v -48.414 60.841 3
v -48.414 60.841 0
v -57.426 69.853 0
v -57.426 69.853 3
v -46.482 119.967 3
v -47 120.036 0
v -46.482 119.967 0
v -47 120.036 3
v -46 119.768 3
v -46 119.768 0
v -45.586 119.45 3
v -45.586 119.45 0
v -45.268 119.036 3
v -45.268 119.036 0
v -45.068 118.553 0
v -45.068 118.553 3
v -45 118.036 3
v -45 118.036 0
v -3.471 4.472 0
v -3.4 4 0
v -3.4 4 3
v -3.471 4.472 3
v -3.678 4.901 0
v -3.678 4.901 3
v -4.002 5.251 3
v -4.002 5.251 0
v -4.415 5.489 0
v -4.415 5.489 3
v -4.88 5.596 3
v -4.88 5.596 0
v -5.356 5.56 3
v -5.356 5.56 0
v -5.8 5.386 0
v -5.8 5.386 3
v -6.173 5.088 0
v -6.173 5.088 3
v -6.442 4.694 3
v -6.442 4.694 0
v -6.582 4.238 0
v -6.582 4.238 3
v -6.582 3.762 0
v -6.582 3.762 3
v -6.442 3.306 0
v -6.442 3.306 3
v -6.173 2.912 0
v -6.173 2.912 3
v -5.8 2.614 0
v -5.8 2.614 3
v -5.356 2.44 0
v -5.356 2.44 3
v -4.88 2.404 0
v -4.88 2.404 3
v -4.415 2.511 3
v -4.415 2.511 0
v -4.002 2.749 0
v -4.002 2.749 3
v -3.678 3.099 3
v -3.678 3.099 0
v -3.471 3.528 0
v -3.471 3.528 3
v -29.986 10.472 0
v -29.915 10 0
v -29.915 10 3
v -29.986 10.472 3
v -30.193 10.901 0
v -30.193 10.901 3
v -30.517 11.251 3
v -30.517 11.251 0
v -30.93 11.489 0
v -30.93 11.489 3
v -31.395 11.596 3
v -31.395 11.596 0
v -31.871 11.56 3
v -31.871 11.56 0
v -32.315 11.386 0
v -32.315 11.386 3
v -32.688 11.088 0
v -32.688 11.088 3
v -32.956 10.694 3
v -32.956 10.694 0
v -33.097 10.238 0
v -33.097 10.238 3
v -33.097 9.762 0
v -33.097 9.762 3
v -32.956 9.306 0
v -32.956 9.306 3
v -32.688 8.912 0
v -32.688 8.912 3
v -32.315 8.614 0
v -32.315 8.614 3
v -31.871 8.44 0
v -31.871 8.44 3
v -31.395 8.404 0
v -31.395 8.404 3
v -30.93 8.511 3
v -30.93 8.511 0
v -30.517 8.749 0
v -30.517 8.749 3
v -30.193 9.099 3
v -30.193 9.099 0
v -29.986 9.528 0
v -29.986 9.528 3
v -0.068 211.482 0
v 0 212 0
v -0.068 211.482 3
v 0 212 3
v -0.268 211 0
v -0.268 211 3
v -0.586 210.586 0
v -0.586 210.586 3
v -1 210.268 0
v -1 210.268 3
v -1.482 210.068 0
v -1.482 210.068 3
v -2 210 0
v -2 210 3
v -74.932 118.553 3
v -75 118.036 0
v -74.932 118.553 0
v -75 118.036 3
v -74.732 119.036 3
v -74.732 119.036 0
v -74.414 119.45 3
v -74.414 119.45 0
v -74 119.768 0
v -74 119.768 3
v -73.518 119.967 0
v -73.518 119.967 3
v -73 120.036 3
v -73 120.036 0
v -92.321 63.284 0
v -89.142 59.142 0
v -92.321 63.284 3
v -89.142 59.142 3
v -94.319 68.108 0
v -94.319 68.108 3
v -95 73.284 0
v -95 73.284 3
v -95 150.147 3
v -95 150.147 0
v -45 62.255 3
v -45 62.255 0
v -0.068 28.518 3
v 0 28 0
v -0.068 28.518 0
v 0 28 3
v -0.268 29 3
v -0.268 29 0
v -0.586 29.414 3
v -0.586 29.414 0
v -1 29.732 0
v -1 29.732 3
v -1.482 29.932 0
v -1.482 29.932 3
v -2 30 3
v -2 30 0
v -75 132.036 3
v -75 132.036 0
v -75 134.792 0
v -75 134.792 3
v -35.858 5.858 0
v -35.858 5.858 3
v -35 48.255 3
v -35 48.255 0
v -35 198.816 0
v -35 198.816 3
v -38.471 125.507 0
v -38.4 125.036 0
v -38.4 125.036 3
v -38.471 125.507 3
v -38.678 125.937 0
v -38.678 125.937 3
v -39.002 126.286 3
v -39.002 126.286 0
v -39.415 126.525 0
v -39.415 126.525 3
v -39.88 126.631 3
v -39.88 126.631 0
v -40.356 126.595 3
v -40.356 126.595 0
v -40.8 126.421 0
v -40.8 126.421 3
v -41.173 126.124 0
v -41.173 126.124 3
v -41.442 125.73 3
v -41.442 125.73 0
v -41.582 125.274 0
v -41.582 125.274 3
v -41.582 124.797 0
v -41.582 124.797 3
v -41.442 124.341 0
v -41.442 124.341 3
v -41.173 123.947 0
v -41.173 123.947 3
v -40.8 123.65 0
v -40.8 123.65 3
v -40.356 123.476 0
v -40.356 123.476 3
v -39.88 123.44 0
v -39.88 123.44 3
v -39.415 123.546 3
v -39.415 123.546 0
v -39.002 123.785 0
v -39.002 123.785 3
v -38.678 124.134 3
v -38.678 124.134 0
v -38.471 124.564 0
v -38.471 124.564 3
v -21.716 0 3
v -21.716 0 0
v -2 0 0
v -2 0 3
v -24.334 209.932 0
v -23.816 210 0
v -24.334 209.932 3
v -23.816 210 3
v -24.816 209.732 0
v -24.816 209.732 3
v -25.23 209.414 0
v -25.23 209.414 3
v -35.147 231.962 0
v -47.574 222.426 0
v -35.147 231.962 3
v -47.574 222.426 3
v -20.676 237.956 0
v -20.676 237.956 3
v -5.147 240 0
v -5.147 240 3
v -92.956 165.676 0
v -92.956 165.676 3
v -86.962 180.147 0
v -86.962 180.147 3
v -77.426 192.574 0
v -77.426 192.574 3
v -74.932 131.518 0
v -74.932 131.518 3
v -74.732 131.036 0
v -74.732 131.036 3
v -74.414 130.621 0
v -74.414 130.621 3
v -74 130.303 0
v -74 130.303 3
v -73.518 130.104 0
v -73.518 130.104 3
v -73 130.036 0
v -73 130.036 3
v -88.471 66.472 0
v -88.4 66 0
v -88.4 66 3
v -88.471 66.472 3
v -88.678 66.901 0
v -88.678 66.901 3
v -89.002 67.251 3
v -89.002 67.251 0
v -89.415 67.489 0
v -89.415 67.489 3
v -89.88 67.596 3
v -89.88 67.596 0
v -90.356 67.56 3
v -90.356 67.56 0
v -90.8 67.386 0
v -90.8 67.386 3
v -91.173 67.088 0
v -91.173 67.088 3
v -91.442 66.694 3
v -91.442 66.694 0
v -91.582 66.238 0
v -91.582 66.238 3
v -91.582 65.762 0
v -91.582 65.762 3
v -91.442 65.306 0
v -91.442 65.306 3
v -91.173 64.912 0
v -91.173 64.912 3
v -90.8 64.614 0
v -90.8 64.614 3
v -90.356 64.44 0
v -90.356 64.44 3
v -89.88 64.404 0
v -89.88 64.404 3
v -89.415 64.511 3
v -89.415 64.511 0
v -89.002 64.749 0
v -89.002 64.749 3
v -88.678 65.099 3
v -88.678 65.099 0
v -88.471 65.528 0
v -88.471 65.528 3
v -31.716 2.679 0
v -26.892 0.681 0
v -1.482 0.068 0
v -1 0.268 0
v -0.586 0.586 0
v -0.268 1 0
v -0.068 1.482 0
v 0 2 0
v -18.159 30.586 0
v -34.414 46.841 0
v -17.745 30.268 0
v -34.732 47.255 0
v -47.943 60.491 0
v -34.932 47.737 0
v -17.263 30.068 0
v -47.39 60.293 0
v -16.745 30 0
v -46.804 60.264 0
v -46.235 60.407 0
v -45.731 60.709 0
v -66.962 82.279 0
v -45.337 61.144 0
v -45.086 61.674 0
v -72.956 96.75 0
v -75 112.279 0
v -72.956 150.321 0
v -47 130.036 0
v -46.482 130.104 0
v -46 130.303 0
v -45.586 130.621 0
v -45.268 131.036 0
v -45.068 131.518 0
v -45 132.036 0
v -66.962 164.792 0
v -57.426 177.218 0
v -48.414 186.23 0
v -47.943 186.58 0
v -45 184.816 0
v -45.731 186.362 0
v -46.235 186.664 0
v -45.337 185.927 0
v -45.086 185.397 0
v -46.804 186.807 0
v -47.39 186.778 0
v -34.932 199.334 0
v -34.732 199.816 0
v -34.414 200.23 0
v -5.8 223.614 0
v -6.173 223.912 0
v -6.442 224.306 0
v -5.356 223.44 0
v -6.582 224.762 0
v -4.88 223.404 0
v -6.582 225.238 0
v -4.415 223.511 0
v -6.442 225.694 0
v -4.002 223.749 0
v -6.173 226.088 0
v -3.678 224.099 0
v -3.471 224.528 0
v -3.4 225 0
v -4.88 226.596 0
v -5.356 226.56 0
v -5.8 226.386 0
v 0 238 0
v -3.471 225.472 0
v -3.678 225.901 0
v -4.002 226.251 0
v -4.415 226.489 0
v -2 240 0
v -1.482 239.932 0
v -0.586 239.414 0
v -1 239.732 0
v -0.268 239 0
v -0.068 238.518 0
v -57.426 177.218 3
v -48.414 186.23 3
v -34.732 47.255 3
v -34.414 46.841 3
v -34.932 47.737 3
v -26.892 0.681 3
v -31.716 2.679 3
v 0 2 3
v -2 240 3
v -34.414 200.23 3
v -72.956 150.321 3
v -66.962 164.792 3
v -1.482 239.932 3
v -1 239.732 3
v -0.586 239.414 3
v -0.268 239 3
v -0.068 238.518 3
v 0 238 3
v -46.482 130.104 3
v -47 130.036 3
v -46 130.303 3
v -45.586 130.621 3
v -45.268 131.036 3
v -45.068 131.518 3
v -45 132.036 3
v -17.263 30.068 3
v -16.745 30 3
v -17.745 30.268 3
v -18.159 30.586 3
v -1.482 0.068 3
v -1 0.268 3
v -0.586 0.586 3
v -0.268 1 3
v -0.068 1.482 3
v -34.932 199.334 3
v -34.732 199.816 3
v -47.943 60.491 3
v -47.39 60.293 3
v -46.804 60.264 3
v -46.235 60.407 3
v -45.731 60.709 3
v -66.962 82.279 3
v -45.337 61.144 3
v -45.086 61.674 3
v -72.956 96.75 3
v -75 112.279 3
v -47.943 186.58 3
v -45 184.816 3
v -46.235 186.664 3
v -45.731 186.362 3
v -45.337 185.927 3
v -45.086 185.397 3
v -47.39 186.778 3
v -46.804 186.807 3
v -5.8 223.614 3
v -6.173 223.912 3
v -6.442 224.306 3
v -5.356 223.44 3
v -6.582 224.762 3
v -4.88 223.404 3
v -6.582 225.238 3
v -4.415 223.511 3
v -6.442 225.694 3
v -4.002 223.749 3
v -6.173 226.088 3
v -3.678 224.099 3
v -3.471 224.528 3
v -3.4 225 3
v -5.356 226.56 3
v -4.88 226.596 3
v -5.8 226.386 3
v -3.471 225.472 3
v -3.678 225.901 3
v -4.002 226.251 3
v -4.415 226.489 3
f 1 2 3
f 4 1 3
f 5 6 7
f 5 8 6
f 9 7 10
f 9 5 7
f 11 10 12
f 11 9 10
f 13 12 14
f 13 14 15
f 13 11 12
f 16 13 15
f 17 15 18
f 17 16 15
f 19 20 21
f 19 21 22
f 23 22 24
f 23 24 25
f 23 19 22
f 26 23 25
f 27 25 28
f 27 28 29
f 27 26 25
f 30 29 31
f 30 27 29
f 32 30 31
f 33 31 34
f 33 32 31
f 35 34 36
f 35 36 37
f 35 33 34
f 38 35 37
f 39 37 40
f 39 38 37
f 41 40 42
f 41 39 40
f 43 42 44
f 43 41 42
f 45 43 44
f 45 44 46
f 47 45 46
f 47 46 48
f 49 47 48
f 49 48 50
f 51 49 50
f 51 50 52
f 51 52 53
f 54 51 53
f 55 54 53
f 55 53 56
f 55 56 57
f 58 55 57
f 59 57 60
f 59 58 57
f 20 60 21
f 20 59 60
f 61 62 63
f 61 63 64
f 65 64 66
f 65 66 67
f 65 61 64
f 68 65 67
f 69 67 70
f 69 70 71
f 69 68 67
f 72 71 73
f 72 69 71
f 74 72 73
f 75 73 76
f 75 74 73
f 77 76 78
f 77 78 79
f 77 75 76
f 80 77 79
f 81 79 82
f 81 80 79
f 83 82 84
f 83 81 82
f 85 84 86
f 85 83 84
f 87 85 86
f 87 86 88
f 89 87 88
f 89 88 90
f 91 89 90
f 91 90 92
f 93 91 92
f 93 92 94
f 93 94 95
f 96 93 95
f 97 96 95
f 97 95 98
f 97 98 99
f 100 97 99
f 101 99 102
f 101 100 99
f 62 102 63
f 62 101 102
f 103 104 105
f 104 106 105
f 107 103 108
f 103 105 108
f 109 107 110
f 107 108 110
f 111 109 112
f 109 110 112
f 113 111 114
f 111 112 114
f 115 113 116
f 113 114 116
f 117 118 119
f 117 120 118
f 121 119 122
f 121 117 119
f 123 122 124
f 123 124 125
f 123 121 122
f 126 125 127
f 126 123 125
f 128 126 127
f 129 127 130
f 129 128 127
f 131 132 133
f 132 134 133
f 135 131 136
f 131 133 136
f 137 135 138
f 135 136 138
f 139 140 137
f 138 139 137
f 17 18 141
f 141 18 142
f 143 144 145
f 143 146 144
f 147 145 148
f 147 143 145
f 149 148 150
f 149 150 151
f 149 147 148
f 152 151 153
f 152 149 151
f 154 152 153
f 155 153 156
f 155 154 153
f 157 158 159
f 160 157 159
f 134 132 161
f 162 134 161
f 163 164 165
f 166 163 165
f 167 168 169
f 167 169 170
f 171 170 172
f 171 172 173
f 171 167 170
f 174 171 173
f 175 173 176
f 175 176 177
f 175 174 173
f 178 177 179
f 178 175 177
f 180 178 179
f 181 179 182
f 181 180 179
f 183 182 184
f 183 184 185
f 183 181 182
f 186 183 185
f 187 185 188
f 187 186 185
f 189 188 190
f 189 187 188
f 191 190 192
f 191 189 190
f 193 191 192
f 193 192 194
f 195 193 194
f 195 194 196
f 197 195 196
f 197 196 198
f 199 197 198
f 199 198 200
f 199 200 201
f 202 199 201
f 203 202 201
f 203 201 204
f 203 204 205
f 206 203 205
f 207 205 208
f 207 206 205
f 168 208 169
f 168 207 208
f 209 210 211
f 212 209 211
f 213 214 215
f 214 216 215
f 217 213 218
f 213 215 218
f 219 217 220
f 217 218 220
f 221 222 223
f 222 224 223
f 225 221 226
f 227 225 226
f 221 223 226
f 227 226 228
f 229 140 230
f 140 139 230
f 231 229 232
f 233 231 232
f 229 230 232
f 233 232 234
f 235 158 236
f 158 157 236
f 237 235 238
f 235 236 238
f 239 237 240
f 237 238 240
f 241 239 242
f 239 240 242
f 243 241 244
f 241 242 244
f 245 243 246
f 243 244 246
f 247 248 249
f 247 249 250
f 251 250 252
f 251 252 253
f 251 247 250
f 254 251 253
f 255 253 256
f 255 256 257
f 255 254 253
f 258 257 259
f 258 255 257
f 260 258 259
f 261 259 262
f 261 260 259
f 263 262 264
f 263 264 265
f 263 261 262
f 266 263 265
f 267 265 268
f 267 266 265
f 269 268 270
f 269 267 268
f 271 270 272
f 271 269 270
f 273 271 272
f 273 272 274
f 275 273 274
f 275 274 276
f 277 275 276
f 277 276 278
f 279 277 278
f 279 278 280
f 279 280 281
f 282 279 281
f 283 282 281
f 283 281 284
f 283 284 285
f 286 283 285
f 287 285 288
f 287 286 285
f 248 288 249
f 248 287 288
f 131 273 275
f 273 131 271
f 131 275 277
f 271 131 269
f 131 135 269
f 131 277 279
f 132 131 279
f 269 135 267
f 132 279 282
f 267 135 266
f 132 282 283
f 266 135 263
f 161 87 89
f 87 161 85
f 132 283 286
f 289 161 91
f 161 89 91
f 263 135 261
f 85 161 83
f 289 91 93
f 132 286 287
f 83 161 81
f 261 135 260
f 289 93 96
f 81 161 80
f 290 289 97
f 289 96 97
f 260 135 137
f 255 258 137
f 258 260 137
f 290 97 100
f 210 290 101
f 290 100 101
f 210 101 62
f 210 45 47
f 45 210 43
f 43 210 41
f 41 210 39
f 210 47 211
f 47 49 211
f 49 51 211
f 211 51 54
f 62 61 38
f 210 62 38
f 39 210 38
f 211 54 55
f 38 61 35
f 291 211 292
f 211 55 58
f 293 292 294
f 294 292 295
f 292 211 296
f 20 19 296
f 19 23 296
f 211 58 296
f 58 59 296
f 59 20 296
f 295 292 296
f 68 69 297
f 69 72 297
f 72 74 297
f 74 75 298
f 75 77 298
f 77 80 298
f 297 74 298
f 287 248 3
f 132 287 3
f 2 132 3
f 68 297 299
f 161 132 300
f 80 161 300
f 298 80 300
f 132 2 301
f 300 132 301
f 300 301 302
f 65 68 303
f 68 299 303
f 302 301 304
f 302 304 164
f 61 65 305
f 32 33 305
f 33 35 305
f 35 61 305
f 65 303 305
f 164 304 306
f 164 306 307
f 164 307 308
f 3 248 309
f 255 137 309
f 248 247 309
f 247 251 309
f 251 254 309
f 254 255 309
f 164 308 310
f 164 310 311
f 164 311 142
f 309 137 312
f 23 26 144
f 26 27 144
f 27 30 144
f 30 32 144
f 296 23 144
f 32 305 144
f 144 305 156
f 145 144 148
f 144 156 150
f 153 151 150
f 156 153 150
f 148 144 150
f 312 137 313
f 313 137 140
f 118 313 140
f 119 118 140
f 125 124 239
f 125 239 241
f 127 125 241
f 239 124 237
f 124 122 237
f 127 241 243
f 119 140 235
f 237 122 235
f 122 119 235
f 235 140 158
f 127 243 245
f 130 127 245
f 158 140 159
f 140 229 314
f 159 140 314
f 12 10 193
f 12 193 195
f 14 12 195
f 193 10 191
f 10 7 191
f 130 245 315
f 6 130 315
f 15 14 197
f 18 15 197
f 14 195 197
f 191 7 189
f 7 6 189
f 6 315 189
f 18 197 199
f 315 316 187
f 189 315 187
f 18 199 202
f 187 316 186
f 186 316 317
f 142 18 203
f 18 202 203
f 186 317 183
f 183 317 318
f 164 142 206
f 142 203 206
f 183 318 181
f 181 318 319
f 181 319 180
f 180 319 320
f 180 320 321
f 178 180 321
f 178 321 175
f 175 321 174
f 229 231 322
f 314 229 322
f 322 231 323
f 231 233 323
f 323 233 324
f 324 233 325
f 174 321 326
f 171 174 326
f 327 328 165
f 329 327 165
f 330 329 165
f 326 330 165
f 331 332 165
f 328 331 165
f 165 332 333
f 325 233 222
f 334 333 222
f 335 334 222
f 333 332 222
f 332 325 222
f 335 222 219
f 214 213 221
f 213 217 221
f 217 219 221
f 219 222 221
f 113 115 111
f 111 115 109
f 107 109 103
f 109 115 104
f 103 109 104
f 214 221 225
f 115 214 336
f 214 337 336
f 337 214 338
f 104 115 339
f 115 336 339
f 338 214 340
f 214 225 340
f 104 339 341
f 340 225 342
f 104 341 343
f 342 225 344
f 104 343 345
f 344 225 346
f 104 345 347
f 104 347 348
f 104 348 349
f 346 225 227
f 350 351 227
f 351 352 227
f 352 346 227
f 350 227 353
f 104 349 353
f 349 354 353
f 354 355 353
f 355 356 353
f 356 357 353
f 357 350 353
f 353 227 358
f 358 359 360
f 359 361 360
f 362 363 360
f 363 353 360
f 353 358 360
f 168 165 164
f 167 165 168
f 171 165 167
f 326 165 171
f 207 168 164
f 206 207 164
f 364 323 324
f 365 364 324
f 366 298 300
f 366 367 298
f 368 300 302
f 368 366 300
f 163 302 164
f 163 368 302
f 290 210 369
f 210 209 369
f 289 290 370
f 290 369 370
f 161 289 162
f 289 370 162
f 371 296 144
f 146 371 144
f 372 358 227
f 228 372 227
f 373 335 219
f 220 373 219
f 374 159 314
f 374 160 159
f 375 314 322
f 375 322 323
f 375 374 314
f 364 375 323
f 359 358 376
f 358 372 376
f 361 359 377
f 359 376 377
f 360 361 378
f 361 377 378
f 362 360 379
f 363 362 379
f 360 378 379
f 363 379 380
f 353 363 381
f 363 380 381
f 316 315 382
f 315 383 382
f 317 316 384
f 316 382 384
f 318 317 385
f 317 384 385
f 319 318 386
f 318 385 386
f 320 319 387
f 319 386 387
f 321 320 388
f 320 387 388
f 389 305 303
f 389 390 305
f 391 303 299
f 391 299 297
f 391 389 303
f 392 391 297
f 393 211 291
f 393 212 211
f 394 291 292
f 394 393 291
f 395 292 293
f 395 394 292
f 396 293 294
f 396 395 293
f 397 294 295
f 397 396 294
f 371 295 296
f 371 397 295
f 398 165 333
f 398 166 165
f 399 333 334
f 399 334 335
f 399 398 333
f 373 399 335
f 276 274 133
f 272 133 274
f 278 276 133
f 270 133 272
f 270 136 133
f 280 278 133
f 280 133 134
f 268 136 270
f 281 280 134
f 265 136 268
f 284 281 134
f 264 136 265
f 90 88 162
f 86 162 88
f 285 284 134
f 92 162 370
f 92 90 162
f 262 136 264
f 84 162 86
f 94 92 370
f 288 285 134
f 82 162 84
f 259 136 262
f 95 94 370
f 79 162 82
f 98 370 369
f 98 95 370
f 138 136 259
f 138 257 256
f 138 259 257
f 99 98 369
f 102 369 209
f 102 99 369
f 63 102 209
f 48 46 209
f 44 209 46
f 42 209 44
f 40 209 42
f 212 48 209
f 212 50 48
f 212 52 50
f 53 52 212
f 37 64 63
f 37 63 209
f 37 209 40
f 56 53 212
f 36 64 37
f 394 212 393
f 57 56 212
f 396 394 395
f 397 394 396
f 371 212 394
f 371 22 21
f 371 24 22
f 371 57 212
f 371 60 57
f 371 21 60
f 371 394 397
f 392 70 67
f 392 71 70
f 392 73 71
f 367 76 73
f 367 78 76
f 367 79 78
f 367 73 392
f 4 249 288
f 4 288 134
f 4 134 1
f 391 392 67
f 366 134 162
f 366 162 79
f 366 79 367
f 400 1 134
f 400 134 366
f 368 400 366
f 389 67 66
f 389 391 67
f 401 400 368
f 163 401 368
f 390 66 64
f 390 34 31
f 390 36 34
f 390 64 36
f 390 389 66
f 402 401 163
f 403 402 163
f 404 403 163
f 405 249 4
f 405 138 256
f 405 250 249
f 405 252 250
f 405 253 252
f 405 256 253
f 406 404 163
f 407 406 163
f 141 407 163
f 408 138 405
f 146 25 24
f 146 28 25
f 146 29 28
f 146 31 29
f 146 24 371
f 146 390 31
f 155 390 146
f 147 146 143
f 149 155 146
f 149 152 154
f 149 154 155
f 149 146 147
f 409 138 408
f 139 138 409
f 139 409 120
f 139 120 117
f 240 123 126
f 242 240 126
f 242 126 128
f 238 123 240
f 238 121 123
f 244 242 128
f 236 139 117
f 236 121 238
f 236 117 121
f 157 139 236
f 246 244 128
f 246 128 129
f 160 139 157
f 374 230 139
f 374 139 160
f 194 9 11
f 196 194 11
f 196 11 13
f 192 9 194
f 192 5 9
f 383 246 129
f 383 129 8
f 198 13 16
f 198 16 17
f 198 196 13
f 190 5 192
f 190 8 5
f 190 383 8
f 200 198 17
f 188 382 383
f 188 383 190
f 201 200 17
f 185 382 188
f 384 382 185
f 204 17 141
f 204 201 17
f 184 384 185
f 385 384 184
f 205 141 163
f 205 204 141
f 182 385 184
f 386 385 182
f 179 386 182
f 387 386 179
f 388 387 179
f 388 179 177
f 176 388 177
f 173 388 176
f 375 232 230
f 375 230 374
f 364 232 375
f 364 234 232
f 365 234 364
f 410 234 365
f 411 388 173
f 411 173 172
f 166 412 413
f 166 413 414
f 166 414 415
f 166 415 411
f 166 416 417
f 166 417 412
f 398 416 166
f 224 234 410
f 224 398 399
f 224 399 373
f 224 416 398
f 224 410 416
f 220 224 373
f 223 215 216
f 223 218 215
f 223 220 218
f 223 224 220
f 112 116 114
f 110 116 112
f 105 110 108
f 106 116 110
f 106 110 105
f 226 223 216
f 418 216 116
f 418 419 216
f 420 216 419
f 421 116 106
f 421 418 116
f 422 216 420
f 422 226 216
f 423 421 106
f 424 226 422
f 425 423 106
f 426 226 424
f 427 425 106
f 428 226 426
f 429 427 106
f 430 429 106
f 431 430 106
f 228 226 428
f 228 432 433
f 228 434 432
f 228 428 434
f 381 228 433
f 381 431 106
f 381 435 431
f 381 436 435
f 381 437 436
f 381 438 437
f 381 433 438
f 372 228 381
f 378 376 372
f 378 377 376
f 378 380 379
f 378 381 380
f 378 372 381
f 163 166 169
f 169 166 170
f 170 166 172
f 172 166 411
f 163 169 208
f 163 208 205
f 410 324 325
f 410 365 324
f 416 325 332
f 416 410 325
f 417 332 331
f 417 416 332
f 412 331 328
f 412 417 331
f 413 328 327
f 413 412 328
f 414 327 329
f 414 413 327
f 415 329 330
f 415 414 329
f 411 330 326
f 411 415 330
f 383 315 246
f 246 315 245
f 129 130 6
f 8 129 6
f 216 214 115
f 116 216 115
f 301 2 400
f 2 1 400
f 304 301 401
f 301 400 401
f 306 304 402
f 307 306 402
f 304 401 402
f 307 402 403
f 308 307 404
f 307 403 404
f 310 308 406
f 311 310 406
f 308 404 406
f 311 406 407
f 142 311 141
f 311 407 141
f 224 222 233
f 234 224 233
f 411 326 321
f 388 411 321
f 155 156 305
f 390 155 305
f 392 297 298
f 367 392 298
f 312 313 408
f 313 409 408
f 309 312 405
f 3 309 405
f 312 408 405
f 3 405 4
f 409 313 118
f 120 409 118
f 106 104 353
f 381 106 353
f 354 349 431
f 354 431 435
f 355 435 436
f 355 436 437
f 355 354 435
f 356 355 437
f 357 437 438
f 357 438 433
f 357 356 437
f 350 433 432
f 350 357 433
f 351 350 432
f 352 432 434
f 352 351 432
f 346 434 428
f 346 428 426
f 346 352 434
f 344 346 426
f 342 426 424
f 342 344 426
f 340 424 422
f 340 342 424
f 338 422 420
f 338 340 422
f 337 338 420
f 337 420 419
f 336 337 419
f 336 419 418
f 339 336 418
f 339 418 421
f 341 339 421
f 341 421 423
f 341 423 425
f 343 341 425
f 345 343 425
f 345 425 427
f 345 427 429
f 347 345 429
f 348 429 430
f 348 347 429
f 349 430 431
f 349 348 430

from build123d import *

# Parameters (mm, degrees)
SKETCH_1_R      = 1.6
EXTRUDE_1_DEPTH = 3
FILLET_1_R      = 60
FILLET_2_R      = 2
FILLET_3_R      = 20
FILLET_4_R      = 2


with BuildPart() as part:
    # ｽｹｯﾁ1 → ﾎﾞｽ - 押し出し1 (new body)
    with BuildSketch(Plane.XY):
        Polygon((-30, 0), (0, 0), (0, 30), (-17.573593129, 30), (-35, 47.426406871), (-35, 199.644660941), (-24.644660941, 210), (0, 210), (0, 240), (-30, 240), (-95, 175), (-95, 65), align=None)
        Polygon((-75, 159.644660941), (-45, 189.644660941), (-45, 130.035533906), (-75, 130.035533906), align=None, mode=Mode.SUBTRACT)
        Polygon((-45, 120.035533906), (-45, 57.426406871), (-75, 87.426406871), (-75, 120.035533906), align=None, mode=Mode.SUBTRACT)
        with Locations((-90, 66)):
            Circle(SKETCH_1_R, mode=Mode.SUBTRACT)
        with Locations((-31.514718626, 10)):
            Circle(SKETCH_1_R, mode=Mode.SUBTRACT)
        with Locations((-5, 4)):
            Circle(SKETCH_1_R, mode=Mode.SUBTRACT)
        with Locations((-5, 225)):
            Circle(SKETCH_1_R, mode=Mode.SUBTRACT)
        with Locations((-40, 125.035533906)):
            Circle(SKETCH_1_R, mode=Mode.SUBTRACT)
    extrude(amount=EXTRUDE_1_DEPTH)

    # ﾌｨﾚｯﾄ1
    fillet_1_edges = [part.edges().sort_by_distance(p)[0] for p in [
        (-75, 159.644660941, 1.5),
        (-95, 175, 1.5),
        (-30, 240, 1.5),
        (-75, 87.426406871, 1.5),
    ]]
    fillet(fillet_1_edges, radius=FILLET_1_R)

    # ﾌｨﾚｯﾄ2
    fillet_2_edges = [part.edges().sort_by_distance(p)[0] for p in [
        (-17.573593129, 30, 1.5),
        (0, 30, 1.5),
        (0, 0, 1.5),
        (0, 240, 1.5),
        (0, 210, 1.5),
        (-24.644660941, 210, 1.5),
        (-35, 199.644660941, 1.5),
        (-35, 47.426406871, 1.5),
    ]]
    fillet(fillet_2_edges, radius=FILLET_2_R)

    # ﾌｨﾚｯﾄ3
    fillet_3_edges = [part.edges().sort_by_distance(p)[0] for p in [
        (-30, 0, 1.5),
        (-95, 65, 1.5),
    ]]
    fillet(fillet_3_edges, radius=FILLET_3_R)

    # ﾌｨﾚｯﾄ4
    fillet_4_edges = [part.edges().sort_by_distance(p)[0] for p in [
        (-45, 189.644660941, 1.5),
        (-75, 130.035533906, 1.5),
        (-45, 130.035533906, 1.5),
        (-75, 120.035533906, 1.5),
        (-45, 57.426406871, 1.5),
        (-45, 120.035533906, 1.5),
    ]]
    fillet(fillet_4_edges, radius=FILLET_4_R)


solid = part.part
